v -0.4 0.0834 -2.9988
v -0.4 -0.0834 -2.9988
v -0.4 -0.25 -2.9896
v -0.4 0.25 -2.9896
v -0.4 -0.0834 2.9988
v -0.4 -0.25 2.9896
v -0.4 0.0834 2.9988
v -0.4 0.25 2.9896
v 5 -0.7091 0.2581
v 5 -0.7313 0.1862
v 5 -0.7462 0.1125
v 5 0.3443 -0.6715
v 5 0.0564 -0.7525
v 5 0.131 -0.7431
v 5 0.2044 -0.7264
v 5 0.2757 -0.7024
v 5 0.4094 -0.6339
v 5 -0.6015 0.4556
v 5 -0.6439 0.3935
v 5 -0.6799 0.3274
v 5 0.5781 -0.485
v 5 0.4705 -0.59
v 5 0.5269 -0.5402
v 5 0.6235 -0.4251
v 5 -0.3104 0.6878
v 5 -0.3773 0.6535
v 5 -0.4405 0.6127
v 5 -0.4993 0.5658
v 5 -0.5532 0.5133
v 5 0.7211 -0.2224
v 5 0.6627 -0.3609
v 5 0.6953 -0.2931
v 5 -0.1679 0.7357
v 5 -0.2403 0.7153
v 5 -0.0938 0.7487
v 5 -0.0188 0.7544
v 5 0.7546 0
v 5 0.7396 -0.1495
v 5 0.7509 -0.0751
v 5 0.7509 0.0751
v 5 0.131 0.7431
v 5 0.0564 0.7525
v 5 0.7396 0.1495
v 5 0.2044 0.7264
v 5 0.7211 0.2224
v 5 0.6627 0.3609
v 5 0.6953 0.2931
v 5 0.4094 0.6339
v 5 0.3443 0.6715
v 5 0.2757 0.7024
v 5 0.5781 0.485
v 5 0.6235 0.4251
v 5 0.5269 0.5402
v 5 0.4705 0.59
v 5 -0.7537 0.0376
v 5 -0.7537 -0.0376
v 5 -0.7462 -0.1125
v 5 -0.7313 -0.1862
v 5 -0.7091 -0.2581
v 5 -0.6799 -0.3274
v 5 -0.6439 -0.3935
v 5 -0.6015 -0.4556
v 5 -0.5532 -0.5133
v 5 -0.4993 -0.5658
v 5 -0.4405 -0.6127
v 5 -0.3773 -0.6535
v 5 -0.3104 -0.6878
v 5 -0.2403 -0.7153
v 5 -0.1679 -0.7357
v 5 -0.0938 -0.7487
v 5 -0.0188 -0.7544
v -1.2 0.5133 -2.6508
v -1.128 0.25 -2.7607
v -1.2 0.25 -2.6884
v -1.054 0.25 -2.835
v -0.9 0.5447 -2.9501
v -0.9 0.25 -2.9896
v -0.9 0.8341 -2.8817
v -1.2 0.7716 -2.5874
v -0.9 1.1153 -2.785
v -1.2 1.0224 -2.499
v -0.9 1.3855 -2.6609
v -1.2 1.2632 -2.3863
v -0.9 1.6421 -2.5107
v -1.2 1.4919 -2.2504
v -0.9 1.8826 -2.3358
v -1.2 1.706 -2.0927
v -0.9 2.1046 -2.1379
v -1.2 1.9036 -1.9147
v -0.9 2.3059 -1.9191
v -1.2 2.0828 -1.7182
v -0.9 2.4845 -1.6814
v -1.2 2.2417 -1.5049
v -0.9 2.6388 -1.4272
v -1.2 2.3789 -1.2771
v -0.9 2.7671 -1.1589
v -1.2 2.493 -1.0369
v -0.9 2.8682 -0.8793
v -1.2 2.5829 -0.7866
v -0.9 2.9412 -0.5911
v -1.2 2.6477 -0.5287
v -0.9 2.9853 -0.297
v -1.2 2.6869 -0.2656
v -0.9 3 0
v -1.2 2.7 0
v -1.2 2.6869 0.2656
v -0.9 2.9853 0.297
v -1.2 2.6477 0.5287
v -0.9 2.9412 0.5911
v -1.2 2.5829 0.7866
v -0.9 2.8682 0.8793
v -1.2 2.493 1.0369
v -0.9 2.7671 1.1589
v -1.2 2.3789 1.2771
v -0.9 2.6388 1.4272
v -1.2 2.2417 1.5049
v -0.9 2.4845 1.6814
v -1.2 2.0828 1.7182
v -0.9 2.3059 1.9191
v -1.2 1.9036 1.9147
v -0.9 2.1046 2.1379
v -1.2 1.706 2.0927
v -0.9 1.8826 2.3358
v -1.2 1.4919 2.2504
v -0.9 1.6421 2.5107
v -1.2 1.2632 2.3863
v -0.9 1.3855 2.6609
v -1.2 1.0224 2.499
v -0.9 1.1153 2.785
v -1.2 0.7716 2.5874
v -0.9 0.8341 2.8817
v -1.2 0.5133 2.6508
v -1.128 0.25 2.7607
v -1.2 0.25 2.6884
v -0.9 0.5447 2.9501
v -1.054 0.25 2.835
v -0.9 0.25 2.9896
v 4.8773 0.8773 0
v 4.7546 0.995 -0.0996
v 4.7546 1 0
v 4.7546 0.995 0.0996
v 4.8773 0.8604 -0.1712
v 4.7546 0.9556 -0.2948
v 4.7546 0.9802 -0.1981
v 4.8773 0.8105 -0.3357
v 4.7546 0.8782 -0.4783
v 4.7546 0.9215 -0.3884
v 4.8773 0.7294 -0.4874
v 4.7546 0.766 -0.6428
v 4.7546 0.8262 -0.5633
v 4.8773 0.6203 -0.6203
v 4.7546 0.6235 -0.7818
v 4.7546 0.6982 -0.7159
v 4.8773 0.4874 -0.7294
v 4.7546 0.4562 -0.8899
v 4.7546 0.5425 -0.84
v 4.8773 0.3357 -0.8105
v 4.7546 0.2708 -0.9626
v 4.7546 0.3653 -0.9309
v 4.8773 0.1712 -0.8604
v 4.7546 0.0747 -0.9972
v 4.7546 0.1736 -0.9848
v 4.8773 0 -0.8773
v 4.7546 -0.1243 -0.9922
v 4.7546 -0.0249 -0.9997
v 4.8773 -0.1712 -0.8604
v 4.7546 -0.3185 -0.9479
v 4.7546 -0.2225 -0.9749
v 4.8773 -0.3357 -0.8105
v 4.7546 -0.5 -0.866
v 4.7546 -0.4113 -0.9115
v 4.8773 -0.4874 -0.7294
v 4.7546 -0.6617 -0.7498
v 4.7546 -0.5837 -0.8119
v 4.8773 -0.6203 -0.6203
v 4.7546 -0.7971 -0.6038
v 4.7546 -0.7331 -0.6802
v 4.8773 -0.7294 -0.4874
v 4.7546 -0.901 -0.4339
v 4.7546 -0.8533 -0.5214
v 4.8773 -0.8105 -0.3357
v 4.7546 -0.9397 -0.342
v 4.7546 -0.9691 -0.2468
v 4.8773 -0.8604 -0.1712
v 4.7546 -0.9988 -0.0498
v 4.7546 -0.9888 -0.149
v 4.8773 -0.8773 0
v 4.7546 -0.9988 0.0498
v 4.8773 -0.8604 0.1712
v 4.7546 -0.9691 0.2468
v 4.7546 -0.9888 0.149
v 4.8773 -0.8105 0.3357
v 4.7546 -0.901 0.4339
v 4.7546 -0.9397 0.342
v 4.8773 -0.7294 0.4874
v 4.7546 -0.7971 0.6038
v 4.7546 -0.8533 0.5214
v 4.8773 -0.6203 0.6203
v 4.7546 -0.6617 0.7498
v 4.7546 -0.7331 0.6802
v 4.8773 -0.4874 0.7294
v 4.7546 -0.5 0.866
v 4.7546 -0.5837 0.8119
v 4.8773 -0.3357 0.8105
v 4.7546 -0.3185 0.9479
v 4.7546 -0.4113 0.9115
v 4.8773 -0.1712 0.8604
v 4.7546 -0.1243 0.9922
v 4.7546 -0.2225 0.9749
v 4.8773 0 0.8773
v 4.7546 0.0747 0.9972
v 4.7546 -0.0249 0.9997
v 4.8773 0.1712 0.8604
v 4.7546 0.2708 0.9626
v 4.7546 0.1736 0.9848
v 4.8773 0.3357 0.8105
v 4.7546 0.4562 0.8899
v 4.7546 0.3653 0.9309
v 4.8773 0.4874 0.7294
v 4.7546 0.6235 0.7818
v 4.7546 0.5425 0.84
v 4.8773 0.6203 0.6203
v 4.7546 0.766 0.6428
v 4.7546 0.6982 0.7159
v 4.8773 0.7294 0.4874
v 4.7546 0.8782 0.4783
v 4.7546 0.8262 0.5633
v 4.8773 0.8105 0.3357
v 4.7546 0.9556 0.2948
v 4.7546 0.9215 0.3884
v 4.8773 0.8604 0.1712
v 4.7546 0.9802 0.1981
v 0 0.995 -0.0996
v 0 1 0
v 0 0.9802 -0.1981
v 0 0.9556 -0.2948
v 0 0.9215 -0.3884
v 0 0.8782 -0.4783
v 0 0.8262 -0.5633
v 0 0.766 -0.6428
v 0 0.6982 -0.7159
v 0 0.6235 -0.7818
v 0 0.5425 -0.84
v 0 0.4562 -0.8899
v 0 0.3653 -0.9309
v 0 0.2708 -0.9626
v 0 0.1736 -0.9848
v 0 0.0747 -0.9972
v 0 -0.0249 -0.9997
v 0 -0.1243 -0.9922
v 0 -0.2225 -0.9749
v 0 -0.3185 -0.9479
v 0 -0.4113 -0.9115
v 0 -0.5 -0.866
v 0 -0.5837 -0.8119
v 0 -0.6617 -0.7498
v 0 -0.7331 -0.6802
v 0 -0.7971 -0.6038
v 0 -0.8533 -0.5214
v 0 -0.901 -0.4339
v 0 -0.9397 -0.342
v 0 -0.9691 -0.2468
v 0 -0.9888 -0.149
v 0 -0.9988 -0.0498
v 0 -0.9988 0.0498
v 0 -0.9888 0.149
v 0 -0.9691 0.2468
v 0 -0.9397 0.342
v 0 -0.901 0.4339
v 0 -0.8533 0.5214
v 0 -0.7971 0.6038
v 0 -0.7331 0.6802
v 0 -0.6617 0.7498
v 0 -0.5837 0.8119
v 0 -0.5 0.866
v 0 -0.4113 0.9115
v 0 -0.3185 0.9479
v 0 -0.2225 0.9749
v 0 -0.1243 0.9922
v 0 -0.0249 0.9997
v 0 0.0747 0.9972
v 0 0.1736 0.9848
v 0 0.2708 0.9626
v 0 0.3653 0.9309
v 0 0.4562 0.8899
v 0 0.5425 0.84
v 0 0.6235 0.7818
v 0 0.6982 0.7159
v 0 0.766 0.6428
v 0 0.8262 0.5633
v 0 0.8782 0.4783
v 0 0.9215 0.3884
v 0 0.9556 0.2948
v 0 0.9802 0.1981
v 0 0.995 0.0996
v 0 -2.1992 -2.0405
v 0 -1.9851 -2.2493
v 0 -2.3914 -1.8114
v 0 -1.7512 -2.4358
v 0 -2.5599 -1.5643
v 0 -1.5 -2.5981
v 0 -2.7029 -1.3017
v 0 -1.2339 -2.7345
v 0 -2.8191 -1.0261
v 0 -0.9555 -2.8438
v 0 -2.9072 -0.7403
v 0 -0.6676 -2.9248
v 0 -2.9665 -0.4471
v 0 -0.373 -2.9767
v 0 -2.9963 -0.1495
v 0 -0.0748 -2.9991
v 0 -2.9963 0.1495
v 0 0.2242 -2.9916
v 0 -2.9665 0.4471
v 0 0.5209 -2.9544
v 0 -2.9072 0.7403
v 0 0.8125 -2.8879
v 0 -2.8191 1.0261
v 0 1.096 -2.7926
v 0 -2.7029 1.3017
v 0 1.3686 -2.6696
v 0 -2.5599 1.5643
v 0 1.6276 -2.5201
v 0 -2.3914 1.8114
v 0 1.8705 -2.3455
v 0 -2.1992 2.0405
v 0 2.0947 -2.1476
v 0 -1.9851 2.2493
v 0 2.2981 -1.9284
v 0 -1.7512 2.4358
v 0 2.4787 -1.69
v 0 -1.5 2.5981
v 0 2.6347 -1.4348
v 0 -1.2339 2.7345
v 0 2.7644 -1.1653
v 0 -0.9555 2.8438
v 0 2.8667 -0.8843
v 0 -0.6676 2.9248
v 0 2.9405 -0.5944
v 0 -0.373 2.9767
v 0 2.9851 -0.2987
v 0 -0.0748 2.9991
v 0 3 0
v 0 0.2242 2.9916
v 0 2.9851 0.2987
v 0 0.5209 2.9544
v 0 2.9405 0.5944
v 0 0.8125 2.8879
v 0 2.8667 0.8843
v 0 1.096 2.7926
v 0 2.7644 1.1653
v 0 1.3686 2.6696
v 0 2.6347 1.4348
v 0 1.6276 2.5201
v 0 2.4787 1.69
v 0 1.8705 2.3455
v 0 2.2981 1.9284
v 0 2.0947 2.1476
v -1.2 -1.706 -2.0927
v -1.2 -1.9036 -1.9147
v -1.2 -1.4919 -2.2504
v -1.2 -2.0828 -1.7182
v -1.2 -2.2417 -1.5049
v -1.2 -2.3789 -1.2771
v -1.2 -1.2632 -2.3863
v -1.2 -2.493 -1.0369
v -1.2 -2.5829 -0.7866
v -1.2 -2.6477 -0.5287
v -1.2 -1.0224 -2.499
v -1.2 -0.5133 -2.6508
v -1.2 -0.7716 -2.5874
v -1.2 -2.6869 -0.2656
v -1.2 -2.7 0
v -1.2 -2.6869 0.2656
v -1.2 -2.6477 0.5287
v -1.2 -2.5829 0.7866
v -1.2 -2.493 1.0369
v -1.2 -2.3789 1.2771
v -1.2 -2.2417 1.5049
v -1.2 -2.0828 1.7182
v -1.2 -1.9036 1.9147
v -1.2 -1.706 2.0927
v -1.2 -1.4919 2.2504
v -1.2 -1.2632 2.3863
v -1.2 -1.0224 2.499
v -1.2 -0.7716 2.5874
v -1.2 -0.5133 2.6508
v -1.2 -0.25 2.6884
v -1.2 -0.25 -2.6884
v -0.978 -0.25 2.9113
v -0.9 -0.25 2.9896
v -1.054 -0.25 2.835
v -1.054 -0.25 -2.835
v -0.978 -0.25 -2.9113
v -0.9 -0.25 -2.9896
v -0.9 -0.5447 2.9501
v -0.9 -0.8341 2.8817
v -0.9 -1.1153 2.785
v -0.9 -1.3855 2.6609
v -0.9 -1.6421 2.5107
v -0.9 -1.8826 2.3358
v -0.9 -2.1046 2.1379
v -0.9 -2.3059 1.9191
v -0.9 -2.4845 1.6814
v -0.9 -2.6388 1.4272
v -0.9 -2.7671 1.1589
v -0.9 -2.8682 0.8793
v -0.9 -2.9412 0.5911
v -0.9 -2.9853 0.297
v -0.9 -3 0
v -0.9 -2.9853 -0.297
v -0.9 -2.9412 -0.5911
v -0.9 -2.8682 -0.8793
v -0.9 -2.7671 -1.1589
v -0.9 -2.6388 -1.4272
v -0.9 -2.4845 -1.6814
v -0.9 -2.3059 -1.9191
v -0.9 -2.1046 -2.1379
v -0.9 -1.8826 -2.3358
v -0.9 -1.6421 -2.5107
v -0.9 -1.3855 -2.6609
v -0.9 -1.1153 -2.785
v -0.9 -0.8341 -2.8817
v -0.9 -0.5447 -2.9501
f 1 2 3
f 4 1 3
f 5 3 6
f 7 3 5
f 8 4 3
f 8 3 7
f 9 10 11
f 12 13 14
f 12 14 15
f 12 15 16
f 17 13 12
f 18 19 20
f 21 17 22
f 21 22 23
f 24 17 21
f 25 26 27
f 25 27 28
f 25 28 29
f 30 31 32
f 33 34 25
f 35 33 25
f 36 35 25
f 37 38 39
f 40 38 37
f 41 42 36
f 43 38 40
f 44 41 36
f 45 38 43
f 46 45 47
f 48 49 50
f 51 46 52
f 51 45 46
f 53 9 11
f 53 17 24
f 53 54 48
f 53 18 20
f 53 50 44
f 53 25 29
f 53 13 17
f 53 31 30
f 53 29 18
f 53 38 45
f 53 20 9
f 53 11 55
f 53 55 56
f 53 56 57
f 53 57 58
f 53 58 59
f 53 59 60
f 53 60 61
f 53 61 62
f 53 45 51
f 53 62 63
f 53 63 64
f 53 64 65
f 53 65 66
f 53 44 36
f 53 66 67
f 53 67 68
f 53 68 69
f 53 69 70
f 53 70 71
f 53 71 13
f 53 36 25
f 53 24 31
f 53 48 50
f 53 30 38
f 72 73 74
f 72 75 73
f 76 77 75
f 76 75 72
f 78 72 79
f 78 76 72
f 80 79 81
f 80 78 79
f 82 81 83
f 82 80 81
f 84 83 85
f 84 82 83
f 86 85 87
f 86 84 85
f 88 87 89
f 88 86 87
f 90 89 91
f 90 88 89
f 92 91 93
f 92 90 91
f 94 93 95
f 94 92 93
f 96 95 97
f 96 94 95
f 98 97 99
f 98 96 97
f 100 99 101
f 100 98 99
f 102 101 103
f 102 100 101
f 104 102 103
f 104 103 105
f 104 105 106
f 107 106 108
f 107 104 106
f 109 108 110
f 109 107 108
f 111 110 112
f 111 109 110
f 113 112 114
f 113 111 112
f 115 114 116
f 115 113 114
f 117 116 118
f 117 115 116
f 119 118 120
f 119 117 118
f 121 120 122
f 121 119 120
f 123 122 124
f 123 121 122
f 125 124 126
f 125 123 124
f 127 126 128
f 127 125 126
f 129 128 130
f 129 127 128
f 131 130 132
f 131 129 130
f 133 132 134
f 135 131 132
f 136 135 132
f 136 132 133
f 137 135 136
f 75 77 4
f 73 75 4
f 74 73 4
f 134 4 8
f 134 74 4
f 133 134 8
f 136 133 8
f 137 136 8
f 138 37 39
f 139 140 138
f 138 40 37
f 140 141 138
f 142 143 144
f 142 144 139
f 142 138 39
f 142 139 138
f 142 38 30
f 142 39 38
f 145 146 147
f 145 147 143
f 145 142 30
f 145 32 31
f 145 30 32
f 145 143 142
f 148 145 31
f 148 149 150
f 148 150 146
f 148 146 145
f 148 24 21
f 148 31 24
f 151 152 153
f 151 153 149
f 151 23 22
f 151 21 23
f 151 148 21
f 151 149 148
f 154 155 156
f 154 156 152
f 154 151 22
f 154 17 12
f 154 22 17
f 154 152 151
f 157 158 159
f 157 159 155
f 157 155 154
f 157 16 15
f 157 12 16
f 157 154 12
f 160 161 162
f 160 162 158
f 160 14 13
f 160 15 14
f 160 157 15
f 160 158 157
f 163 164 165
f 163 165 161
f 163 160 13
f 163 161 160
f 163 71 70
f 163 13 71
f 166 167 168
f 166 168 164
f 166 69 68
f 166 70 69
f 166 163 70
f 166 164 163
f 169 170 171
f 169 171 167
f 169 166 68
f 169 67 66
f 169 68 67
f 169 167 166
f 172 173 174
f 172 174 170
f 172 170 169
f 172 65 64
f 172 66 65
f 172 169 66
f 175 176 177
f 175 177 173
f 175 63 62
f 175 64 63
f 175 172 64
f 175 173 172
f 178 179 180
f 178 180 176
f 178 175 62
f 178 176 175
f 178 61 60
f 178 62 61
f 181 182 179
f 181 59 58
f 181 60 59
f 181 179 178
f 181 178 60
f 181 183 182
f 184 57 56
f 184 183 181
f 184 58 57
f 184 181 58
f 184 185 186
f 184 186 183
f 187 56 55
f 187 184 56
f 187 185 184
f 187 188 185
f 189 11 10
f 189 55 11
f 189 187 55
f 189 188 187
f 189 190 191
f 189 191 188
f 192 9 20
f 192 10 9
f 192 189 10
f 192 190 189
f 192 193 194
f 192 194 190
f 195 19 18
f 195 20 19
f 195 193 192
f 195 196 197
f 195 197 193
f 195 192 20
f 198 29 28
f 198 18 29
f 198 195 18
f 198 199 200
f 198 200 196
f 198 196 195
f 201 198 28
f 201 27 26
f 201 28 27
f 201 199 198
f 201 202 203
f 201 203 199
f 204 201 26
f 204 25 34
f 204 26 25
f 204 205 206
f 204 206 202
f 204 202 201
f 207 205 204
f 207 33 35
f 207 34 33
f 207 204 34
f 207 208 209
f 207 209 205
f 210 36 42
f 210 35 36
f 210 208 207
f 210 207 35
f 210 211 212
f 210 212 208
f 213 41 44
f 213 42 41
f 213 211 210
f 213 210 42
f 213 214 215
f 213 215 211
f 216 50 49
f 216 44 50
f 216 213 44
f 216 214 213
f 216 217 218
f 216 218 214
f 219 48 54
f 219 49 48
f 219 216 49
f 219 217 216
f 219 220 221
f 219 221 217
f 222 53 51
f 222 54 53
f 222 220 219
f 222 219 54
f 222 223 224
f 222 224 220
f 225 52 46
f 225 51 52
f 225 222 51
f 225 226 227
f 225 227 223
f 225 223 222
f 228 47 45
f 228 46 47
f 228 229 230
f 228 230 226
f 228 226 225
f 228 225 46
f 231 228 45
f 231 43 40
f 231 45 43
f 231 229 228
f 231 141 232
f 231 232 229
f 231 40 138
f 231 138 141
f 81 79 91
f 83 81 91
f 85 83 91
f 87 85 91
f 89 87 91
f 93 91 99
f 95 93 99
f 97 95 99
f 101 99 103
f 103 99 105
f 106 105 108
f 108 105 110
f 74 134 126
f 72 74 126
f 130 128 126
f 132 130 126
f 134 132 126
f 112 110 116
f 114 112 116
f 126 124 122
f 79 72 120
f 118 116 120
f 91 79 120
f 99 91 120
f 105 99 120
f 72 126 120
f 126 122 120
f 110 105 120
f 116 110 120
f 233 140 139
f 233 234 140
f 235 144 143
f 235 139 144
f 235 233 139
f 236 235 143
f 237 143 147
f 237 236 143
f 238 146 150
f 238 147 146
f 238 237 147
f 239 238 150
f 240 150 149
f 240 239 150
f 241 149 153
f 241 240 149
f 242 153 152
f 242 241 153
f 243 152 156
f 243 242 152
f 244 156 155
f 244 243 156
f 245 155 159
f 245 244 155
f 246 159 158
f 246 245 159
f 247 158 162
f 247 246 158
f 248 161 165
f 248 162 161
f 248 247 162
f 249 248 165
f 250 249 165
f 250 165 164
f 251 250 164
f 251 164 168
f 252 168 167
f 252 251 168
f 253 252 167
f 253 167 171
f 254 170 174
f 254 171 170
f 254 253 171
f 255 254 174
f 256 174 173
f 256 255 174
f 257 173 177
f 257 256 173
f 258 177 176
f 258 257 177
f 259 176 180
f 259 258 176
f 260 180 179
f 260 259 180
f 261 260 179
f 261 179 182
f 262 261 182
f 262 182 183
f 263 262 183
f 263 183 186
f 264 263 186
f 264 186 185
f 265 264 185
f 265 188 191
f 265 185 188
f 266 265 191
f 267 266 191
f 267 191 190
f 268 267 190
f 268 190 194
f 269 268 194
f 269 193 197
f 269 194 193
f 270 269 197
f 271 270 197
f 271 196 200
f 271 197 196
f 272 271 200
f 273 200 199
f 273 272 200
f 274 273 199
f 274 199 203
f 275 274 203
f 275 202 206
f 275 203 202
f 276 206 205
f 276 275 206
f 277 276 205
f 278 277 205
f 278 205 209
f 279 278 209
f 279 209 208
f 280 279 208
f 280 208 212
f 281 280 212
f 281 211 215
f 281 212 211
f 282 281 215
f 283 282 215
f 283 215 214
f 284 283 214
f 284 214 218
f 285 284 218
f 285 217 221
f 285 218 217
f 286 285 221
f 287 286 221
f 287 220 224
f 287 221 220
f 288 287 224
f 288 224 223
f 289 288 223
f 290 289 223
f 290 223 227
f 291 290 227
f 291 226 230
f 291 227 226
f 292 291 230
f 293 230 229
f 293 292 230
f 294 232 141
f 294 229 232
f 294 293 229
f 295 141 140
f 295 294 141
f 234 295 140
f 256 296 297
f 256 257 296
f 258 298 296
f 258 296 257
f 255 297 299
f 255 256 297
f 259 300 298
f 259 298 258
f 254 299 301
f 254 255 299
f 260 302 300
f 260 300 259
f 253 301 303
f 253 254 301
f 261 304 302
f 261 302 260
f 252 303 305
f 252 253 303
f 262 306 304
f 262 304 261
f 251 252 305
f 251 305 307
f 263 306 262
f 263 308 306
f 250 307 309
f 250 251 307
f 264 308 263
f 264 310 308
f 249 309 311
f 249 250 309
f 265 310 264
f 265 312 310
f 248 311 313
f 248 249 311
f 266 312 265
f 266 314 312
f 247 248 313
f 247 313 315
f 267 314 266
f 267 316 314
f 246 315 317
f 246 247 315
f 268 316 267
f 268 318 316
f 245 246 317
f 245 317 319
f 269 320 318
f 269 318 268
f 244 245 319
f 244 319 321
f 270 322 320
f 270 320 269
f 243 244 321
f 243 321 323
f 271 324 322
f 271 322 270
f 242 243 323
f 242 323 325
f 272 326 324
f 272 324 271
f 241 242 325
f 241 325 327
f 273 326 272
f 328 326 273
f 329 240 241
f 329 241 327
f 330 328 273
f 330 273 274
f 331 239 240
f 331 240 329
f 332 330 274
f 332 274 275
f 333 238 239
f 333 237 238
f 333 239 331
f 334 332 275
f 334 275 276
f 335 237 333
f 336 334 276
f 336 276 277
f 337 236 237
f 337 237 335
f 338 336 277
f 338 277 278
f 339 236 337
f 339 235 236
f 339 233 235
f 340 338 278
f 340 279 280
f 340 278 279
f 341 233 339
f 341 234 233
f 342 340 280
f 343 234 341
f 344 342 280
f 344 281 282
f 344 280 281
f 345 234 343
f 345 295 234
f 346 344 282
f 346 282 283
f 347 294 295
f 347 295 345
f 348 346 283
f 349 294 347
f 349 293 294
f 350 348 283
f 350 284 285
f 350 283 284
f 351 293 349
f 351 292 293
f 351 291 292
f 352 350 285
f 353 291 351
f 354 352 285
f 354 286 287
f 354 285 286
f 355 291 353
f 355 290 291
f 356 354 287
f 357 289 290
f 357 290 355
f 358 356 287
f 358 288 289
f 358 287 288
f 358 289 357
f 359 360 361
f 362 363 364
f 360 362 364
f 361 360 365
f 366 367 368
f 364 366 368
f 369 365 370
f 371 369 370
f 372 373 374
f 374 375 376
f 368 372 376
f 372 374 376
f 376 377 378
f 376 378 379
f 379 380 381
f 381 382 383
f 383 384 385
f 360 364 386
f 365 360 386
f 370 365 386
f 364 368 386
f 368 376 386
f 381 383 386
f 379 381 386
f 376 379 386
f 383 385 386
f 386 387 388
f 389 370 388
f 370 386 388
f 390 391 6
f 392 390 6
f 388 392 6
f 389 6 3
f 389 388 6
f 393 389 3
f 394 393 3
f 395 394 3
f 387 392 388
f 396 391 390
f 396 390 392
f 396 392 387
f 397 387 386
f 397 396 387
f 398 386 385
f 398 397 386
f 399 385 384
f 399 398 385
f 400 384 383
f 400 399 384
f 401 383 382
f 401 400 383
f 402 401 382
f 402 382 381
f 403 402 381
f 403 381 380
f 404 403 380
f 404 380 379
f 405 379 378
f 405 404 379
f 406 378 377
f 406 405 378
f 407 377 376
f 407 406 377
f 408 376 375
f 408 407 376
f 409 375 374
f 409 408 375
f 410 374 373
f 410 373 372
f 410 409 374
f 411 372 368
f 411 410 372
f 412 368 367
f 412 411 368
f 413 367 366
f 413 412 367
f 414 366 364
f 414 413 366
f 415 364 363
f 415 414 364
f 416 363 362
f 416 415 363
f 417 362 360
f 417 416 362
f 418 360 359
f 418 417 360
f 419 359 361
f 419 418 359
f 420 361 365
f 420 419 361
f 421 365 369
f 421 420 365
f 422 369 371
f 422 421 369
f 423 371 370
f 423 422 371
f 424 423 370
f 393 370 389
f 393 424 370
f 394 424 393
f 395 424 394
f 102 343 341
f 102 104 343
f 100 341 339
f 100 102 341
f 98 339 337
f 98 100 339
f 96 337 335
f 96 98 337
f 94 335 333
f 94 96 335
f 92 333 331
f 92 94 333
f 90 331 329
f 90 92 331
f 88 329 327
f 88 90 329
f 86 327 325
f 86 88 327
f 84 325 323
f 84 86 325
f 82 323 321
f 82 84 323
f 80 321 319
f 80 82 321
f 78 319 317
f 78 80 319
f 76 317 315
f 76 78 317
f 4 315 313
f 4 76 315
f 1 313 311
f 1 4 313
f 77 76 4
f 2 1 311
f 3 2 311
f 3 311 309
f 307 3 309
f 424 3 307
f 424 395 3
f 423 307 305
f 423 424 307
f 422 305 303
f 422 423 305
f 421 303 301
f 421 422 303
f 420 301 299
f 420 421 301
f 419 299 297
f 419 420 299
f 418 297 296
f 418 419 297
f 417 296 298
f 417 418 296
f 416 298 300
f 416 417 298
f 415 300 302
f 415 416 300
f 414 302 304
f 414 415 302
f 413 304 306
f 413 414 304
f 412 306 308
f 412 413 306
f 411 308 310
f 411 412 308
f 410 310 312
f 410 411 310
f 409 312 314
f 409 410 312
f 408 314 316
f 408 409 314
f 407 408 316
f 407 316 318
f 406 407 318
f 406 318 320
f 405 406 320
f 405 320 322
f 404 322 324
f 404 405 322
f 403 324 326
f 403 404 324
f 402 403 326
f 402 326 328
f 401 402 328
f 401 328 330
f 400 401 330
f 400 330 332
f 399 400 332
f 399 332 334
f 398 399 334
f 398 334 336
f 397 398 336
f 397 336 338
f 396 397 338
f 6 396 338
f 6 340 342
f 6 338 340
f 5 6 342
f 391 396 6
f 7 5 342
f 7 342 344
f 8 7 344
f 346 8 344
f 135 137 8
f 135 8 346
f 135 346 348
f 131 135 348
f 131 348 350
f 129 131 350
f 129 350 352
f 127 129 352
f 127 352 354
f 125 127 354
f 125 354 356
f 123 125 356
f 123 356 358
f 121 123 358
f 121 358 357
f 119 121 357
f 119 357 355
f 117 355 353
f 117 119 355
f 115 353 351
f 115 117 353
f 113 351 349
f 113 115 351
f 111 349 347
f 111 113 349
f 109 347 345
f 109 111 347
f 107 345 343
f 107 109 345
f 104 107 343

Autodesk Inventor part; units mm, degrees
ref_plane "YZ Plane" through (0, 0, 0) normal (1, 0, 0) x (0, 1, 0)
ref_plane "XZ Plane" through (0, 0, 0) normal (0, 1, 0) x (-1, 0, 0)
sketch "Sketch1" plane through (0, 0, 0) normal (0, 0, 1) x (1, 0, 0)
  line L0 (-1.2, 0) -> (5, 0)
  line L1 (5, 0) -> (5, 1)
  line L2 (5, 1) -> (0, 1)
  line L3 (0, 1) -> (0, 3)
  line L4 (0, 3) -> (-1.2, 3)
  line L5 (-2.44, 0) -> (6.24, 0) projected
  line L6 (-1.2, 0) -> (-1.2, 3)
  line L7 (0, -0.6) -> (0, 3.6) projected
  dimension "d0" = 5
  dimension "d1" = 2
  dimension "d2" = 6
  dimension "d15" = 1.2
revolve "Body" add sketch "Sketch1" angle 360 about axis through (-1.2, 0, 0) along (1, 0, 0)
sketch "Sketch2" plane through (-1.2, 0, 0) normal (-1, 0, 0) x (0, 0, 1)
  circle A0 centre (0, 0) radius 3 projected
  line L0 (0, -4.2) -> (0, 4.2) projected
  line L1 (-4.2, 0) -> (4.2, 0) projected
  line L2 (-3, 0.25) -> (3, 0.25)
  line L3 (3, 0.25) -> (3, -0.25)
  line L4 (3, -0.25) -> (-3, -0.25)
  line L5 (-3, -0.25) -> (-3, 0.25)
  line L6 (-3, 0) -> (3, 0) construction
  line L7 (0, 0.25) -> (0, -0.25) construction
  dimension "d10" = 0.5
extrude "Slot" cut sketch "Sketch2" against normal blind 0.8 contours L1 L0 L2 A0 | L3 L4 A0 | A0 L4 L0 L1 | A0 L2 L3 | L1 A0 L2 L0 | L0 L4 A0 L1 | L5 L2 A0 | A0 L4 L5
chamfer "Chamfer1" distance 0.3 angle 45 3 edges at (-1.2, -3, 0) (-1.2, 2.2079, 2.031) (-1.2, 2.2079, -2.031) measured on face at (-0.5333, -0.7686, -2.8999)
thread "Thread" size "M2x0.4" class "6g" standard "ISO Metric profile" length 4.2
chamfer "Chamfer2" distance 0.2454 distance2 0.2454 1 edges at (5, -1, 0) measured on face at (5, 0.5392, -0.3309)
ref_plane "Work Plane1" through (2.5, 0, 0) normal (0, 0, -1) x (1, 0, 0)
equation "\"d0\" = NLG"
equation "\"d1\" = NND"
equation "\"d2\" = KOD"
equation "\"d15\" = KOH"
equation "\"d10\" = SBR"
equation "\"d11\" = STI"
equation "\"d13\" = PHH"
equation "\"d23\" = PHH"
equation "\"d3\" = GEL"
equation "\"d5\" = -0.5 * GD1 + 0.5 * NND"
equation "\"d6\" = GUL"
equation "\"NND\" = 2"
equation "\"NLG\" = 5"
equation "\"GEL\" = NLG - 2 * PTC"
equation "\"KOD\" = 6"
equation "\"KOH\" = 1.2"
equation "\"GUL\" = 0.61345 * PTC"
equation "\"PHH\" = 0.3"
equation "\"SBR\" = 0.5"
equation "\"STI\" = 0.8"
equation "\"GD1\" = THREADDIA - 1.2269 * PTC"
equation "\"THREADDIA\" = 2"
equation "\"TOA\" = 30deg"
equation "\"PTC\" = 0.4"
equation "\"GAL\" = 0.61345 * PTC"
properties part number "DIN 921 - M2 x 5" material "Steel, Mild"
